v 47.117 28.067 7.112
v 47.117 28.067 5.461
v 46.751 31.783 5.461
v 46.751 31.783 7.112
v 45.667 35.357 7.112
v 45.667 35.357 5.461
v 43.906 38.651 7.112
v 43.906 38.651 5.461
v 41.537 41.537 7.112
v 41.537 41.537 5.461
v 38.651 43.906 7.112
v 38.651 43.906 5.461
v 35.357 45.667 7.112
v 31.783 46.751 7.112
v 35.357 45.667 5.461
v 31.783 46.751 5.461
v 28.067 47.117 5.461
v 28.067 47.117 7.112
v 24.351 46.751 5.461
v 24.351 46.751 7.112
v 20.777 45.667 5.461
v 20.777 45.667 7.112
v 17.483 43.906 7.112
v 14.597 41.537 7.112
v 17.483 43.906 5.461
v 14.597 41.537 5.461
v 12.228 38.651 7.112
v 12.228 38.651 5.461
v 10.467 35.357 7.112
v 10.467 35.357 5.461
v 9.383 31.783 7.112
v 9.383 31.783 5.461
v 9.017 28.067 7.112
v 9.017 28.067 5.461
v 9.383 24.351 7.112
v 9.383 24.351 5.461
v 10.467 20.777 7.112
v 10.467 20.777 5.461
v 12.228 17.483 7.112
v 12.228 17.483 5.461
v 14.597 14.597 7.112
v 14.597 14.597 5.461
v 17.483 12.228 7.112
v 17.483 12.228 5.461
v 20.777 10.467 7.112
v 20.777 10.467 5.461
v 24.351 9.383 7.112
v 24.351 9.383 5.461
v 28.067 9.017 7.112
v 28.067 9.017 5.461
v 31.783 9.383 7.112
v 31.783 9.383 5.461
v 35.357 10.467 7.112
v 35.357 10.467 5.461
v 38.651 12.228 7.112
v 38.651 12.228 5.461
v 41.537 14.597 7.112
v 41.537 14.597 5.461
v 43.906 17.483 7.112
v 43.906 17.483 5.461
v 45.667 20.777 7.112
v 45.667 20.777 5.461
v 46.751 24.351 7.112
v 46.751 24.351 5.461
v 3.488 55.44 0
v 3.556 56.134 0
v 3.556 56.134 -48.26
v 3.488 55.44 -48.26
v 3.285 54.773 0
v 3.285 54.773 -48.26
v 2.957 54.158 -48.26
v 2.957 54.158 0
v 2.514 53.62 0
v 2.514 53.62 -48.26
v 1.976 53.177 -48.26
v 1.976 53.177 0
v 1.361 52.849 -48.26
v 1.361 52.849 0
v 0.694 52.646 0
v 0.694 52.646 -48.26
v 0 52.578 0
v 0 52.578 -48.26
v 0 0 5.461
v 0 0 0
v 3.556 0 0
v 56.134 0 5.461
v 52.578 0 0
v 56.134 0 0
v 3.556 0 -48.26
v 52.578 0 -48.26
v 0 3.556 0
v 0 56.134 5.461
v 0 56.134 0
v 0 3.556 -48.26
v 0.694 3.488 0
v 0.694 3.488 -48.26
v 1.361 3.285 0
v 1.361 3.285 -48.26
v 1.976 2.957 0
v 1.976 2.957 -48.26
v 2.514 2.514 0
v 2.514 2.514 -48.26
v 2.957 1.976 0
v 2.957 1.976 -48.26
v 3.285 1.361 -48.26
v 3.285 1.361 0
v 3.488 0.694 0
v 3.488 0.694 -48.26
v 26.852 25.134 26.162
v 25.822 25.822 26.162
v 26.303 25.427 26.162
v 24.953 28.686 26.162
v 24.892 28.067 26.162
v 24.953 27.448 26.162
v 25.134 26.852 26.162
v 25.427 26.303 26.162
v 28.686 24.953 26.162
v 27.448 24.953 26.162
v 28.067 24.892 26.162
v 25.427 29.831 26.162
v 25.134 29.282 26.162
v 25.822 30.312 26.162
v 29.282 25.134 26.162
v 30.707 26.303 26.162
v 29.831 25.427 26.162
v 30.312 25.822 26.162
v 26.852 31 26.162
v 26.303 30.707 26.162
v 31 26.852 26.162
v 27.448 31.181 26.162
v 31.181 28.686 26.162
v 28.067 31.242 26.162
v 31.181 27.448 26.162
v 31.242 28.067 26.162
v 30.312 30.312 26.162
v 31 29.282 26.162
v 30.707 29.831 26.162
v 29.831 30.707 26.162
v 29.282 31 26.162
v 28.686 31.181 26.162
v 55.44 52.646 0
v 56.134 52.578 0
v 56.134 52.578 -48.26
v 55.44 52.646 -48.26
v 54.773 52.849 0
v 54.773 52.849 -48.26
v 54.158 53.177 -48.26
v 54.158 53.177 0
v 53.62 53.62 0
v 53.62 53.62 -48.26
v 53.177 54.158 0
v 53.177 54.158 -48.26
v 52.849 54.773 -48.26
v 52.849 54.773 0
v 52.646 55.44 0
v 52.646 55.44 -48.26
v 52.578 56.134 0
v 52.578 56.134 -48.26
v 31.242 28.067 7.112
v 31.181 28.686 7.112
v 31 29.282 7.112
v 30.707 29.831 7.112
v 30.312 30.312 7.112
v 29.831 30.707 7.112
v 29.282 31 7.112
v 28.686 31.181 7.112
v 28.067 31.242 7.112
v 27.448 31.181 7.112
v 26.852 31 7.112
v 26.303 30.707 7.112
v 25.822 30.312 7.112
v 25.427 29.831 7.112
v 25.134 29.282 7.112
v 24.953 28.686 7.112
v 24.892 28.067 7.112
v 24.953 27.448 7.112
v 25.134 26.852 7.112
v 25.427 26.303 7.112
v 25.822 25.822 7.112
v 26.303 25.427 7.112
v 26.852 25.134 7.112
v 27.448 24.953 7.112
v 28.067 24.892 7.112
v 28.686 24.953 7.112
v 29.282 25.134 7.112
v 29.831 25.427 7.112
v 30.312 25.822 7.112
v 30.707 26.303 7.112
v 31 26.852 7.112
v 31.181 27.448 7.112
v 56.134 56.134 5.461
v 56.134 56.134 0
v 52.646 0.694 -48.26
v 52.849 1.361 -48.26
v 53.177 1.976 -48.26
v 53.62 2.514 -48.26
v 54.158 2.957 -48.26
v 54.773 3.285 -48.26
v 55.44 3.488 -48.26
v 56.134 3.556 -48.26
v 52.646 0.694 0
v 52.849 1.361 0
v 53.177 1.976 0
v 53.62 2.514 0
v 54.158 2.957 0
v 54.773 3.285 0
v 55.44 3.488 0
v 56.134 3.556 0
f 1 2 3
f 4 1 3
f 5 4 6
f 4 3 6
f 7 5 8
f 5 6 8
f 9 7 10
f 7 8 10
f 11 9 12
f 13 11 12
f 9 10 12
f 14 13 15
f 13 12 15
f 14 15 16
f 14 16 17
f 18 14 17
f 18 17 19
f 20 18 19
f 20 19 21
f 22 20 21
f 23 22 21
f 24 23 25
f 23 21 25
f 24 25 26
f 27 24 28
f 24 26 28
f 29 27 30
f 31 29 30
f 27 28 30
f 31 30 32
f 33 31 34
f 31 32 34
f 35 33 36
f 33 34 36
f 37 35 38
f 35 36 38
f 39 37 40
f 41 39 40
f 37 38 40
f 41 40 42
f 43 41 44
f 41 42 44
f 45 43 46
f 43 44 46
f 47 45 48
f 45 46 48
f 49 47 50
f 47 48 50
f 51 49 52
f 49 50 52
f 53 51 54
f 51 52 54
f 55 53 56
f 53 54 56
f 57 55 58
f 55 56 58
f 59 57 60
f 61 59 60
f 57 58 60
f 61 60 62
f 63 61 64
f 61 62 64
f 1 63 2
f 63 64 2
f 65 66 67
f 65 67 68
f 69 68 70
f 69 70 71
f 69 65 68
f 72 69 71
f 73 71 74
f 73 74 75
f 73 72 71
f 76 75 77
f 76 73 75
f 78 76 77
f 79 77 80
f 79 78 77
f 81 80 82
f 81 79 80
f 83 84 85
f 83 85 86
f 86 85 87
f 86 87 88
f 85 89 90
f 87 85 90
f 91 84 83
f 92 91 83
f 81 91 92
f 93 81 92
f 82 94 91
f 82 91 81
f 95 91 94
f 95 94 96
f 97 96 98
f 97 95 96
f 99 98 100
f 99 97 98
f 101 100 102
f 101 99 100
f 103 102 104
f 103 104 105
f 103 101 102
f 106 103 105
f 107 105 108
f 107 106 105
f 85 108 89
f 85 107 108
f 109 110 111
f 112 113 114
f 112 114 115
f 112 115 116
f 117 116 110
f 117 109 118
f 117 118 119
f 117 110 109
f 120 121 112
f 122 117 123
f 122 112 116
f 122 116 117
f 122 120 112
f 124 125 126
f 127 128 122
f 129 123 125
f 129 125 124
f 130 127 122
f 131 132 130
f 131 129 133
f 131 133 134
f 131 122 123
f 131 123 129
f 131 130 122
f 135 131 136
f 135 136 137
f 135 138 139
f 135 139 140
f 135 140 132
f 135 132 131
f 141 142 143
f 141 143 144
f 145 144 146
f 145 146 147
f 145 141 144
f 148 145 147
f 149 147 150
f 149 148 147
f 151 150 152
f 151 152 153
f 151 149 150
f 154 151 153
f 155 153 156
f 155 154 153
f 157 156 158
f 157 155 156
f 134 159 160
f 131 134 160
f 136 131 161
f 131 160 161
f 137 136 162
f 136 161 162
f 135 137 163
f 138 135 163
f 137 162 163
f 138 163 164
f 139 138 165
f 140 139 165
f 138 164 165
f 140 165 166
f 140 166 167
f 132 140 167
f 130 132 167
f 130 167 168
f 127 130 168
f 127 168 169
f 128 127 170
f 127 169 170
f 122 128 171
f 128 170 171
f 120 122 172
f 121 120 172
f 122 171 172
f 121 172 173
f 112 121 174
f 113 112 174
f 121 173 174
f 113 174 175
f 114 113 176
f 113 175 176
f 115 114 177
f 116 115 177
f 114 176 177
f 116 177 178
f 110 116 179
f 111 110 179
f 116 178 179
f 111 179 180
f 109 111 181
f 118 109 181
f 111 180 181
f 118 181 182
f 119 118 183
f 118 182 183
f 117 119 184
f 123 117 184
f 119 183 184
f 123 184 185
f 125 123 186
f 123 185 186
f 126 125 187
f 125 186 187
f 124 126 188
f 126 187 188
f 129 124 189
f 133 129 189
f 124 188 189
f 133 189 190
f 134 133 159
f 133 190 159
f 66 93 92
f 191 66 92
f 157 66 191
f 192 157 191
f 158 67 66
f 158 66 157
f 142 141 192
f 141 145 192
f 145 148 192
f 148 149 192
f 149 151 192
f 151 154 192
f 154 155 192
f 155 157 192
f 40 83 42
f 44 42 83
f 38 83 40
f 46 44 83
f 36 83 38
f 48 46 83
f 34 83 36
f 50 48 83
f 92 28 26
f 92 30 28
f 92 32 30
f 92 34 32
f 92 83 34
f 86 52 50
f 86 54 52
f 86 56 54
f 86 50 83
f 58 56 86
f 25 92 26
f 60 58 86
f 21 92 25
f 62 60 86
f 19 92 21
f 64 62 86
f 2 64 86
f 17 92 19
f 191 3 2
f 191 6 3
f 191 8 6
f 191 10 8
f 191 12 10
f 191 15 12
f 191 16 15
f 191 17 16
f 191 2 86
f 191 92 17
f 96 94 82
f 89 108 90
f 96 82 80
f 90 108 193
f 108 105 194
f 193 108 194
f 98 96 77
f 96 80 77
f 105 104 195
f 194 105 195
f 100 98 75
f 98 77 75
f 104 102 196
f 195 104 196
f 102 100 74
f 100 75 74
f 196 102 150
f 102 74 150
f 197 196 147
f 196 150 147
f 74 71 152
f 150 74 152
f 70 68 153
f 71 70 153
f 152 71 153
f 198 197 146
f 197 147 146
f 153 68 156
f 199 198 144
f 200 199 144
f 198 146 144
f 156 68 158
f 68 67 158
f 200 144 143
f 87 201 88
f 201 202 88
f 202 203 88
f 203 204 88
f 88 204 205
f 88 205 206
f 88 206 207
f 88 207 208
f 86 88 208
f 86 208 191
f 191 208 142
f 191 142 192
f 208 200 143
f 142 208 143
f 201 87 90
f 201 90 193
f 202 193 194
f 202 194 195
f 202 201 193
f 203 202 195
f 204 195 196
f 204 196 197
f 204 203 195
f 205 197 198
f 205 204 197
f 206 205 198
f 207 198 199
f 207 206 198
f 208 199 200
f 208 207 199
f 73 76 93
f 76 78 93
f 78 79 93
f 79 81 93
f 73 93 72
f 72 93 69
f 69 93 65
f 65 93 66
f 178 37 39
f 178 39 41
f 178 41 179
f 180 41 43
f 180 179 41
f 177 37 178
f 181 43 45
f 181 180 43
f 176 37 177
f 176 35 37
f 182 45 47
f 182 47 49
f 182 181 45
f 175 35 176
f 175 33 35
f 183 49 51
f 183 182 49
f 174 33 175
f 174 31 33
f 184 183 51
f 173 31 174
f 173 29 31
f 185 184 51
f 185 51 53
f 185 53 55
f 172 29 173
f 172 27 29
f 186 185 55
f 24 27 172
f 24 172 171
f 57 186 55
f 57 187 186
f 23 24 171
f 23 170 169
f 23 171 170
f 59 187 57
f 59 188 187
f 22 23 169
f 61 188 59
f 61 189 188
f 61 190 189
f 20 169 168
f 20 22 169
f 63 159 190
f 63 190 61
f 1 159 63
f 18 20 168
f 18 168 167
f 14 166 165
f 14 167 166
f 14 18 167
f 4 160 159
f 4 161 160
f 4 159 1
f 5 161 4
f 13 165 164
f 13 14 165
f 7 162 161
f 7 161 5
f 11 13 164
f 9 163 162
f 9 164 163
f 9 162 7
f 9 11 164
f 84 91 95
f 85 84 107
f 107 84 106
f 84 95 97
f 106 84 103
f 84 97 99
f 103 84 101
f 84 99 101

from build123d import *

# Parameters (mm, degrees)
SKETCH2_W           = 56.134
SKETCH2_H           = 56.134
BOSS_EXTRUDE1_DEPTH = 5.461
SKETCH3_R           = 19.05
BOSS_EXTRUDE2_DEPTH = 1.651
BOSS_EXTRUDE3_DEPTH = 48.26
SKETCH5_R           = 3.175
BOSS_EXTRUDE4_DEPTH = 19.05


with BuildPart() as part:
    # Sketch2 → Boss-Extrude1 (new body)
    with BuildSketch(Plane.XY):
        with Locations((28.067, 28.067)):
            Rectangle(SKETCH2_W, SKETCH2_H)
    extrude(amount=BOSS_EXTRUDE1_DEPTH)

    # Sketch3 → Boss-Extrude2 (add)
    with BuildSketch(Plane.XY.offset(5.461)):
        with Locations((28.067, 28.067)):
            Circle(SKETCH3_R)
    extrude(amount=BOSS_EXTRUDE2_DEPTH)

    # Sketch4 → Boss-Extrude3 (add)
    with BuildSketch(Plane(origin=(0, 0, 0), x_dir=(-1, 0, 0), z_dir=(0, 0, -1))):
        with BuildLine():
            Line((-52.578, 56.134), (-3.556, 56.134))
            ThreePointArc((-3.556, 56.134), (-2.514471714, 53.619528286), (0, 52.578))
            Line((0, 52.578), (0, 3.556))
            ThreePointArc((0, 3.556), (-2.514471714, 2.514471714), (-3.556, 0))
            Line((-3.556, 0), (-52.578, 0))
            ThreePointArc((-52.578, 0), (-53.619528286, 2.514471714), (-56.134, 3.556))
            Line((-56.134, 3.556), (-56.134, 52.578))
            ThreePointArc((-56.134, 52.578), (-53.619528286, 53.619528286), (-52.578, 56.134))
        make_face()
    extrude(amount=BOSS_EXTRUDE3_DEPTH)

    # Sketch5 → Boss-Extrude4 (add)
    with BuildSketch(Plane.XY.offset(7.112)):
        with Locations((28.067, 28.067)):
            Circle(SKETCH5_R)
    extrude(amount=BOSS_EXTRUDE4_DEPTH)


solid = part.part
